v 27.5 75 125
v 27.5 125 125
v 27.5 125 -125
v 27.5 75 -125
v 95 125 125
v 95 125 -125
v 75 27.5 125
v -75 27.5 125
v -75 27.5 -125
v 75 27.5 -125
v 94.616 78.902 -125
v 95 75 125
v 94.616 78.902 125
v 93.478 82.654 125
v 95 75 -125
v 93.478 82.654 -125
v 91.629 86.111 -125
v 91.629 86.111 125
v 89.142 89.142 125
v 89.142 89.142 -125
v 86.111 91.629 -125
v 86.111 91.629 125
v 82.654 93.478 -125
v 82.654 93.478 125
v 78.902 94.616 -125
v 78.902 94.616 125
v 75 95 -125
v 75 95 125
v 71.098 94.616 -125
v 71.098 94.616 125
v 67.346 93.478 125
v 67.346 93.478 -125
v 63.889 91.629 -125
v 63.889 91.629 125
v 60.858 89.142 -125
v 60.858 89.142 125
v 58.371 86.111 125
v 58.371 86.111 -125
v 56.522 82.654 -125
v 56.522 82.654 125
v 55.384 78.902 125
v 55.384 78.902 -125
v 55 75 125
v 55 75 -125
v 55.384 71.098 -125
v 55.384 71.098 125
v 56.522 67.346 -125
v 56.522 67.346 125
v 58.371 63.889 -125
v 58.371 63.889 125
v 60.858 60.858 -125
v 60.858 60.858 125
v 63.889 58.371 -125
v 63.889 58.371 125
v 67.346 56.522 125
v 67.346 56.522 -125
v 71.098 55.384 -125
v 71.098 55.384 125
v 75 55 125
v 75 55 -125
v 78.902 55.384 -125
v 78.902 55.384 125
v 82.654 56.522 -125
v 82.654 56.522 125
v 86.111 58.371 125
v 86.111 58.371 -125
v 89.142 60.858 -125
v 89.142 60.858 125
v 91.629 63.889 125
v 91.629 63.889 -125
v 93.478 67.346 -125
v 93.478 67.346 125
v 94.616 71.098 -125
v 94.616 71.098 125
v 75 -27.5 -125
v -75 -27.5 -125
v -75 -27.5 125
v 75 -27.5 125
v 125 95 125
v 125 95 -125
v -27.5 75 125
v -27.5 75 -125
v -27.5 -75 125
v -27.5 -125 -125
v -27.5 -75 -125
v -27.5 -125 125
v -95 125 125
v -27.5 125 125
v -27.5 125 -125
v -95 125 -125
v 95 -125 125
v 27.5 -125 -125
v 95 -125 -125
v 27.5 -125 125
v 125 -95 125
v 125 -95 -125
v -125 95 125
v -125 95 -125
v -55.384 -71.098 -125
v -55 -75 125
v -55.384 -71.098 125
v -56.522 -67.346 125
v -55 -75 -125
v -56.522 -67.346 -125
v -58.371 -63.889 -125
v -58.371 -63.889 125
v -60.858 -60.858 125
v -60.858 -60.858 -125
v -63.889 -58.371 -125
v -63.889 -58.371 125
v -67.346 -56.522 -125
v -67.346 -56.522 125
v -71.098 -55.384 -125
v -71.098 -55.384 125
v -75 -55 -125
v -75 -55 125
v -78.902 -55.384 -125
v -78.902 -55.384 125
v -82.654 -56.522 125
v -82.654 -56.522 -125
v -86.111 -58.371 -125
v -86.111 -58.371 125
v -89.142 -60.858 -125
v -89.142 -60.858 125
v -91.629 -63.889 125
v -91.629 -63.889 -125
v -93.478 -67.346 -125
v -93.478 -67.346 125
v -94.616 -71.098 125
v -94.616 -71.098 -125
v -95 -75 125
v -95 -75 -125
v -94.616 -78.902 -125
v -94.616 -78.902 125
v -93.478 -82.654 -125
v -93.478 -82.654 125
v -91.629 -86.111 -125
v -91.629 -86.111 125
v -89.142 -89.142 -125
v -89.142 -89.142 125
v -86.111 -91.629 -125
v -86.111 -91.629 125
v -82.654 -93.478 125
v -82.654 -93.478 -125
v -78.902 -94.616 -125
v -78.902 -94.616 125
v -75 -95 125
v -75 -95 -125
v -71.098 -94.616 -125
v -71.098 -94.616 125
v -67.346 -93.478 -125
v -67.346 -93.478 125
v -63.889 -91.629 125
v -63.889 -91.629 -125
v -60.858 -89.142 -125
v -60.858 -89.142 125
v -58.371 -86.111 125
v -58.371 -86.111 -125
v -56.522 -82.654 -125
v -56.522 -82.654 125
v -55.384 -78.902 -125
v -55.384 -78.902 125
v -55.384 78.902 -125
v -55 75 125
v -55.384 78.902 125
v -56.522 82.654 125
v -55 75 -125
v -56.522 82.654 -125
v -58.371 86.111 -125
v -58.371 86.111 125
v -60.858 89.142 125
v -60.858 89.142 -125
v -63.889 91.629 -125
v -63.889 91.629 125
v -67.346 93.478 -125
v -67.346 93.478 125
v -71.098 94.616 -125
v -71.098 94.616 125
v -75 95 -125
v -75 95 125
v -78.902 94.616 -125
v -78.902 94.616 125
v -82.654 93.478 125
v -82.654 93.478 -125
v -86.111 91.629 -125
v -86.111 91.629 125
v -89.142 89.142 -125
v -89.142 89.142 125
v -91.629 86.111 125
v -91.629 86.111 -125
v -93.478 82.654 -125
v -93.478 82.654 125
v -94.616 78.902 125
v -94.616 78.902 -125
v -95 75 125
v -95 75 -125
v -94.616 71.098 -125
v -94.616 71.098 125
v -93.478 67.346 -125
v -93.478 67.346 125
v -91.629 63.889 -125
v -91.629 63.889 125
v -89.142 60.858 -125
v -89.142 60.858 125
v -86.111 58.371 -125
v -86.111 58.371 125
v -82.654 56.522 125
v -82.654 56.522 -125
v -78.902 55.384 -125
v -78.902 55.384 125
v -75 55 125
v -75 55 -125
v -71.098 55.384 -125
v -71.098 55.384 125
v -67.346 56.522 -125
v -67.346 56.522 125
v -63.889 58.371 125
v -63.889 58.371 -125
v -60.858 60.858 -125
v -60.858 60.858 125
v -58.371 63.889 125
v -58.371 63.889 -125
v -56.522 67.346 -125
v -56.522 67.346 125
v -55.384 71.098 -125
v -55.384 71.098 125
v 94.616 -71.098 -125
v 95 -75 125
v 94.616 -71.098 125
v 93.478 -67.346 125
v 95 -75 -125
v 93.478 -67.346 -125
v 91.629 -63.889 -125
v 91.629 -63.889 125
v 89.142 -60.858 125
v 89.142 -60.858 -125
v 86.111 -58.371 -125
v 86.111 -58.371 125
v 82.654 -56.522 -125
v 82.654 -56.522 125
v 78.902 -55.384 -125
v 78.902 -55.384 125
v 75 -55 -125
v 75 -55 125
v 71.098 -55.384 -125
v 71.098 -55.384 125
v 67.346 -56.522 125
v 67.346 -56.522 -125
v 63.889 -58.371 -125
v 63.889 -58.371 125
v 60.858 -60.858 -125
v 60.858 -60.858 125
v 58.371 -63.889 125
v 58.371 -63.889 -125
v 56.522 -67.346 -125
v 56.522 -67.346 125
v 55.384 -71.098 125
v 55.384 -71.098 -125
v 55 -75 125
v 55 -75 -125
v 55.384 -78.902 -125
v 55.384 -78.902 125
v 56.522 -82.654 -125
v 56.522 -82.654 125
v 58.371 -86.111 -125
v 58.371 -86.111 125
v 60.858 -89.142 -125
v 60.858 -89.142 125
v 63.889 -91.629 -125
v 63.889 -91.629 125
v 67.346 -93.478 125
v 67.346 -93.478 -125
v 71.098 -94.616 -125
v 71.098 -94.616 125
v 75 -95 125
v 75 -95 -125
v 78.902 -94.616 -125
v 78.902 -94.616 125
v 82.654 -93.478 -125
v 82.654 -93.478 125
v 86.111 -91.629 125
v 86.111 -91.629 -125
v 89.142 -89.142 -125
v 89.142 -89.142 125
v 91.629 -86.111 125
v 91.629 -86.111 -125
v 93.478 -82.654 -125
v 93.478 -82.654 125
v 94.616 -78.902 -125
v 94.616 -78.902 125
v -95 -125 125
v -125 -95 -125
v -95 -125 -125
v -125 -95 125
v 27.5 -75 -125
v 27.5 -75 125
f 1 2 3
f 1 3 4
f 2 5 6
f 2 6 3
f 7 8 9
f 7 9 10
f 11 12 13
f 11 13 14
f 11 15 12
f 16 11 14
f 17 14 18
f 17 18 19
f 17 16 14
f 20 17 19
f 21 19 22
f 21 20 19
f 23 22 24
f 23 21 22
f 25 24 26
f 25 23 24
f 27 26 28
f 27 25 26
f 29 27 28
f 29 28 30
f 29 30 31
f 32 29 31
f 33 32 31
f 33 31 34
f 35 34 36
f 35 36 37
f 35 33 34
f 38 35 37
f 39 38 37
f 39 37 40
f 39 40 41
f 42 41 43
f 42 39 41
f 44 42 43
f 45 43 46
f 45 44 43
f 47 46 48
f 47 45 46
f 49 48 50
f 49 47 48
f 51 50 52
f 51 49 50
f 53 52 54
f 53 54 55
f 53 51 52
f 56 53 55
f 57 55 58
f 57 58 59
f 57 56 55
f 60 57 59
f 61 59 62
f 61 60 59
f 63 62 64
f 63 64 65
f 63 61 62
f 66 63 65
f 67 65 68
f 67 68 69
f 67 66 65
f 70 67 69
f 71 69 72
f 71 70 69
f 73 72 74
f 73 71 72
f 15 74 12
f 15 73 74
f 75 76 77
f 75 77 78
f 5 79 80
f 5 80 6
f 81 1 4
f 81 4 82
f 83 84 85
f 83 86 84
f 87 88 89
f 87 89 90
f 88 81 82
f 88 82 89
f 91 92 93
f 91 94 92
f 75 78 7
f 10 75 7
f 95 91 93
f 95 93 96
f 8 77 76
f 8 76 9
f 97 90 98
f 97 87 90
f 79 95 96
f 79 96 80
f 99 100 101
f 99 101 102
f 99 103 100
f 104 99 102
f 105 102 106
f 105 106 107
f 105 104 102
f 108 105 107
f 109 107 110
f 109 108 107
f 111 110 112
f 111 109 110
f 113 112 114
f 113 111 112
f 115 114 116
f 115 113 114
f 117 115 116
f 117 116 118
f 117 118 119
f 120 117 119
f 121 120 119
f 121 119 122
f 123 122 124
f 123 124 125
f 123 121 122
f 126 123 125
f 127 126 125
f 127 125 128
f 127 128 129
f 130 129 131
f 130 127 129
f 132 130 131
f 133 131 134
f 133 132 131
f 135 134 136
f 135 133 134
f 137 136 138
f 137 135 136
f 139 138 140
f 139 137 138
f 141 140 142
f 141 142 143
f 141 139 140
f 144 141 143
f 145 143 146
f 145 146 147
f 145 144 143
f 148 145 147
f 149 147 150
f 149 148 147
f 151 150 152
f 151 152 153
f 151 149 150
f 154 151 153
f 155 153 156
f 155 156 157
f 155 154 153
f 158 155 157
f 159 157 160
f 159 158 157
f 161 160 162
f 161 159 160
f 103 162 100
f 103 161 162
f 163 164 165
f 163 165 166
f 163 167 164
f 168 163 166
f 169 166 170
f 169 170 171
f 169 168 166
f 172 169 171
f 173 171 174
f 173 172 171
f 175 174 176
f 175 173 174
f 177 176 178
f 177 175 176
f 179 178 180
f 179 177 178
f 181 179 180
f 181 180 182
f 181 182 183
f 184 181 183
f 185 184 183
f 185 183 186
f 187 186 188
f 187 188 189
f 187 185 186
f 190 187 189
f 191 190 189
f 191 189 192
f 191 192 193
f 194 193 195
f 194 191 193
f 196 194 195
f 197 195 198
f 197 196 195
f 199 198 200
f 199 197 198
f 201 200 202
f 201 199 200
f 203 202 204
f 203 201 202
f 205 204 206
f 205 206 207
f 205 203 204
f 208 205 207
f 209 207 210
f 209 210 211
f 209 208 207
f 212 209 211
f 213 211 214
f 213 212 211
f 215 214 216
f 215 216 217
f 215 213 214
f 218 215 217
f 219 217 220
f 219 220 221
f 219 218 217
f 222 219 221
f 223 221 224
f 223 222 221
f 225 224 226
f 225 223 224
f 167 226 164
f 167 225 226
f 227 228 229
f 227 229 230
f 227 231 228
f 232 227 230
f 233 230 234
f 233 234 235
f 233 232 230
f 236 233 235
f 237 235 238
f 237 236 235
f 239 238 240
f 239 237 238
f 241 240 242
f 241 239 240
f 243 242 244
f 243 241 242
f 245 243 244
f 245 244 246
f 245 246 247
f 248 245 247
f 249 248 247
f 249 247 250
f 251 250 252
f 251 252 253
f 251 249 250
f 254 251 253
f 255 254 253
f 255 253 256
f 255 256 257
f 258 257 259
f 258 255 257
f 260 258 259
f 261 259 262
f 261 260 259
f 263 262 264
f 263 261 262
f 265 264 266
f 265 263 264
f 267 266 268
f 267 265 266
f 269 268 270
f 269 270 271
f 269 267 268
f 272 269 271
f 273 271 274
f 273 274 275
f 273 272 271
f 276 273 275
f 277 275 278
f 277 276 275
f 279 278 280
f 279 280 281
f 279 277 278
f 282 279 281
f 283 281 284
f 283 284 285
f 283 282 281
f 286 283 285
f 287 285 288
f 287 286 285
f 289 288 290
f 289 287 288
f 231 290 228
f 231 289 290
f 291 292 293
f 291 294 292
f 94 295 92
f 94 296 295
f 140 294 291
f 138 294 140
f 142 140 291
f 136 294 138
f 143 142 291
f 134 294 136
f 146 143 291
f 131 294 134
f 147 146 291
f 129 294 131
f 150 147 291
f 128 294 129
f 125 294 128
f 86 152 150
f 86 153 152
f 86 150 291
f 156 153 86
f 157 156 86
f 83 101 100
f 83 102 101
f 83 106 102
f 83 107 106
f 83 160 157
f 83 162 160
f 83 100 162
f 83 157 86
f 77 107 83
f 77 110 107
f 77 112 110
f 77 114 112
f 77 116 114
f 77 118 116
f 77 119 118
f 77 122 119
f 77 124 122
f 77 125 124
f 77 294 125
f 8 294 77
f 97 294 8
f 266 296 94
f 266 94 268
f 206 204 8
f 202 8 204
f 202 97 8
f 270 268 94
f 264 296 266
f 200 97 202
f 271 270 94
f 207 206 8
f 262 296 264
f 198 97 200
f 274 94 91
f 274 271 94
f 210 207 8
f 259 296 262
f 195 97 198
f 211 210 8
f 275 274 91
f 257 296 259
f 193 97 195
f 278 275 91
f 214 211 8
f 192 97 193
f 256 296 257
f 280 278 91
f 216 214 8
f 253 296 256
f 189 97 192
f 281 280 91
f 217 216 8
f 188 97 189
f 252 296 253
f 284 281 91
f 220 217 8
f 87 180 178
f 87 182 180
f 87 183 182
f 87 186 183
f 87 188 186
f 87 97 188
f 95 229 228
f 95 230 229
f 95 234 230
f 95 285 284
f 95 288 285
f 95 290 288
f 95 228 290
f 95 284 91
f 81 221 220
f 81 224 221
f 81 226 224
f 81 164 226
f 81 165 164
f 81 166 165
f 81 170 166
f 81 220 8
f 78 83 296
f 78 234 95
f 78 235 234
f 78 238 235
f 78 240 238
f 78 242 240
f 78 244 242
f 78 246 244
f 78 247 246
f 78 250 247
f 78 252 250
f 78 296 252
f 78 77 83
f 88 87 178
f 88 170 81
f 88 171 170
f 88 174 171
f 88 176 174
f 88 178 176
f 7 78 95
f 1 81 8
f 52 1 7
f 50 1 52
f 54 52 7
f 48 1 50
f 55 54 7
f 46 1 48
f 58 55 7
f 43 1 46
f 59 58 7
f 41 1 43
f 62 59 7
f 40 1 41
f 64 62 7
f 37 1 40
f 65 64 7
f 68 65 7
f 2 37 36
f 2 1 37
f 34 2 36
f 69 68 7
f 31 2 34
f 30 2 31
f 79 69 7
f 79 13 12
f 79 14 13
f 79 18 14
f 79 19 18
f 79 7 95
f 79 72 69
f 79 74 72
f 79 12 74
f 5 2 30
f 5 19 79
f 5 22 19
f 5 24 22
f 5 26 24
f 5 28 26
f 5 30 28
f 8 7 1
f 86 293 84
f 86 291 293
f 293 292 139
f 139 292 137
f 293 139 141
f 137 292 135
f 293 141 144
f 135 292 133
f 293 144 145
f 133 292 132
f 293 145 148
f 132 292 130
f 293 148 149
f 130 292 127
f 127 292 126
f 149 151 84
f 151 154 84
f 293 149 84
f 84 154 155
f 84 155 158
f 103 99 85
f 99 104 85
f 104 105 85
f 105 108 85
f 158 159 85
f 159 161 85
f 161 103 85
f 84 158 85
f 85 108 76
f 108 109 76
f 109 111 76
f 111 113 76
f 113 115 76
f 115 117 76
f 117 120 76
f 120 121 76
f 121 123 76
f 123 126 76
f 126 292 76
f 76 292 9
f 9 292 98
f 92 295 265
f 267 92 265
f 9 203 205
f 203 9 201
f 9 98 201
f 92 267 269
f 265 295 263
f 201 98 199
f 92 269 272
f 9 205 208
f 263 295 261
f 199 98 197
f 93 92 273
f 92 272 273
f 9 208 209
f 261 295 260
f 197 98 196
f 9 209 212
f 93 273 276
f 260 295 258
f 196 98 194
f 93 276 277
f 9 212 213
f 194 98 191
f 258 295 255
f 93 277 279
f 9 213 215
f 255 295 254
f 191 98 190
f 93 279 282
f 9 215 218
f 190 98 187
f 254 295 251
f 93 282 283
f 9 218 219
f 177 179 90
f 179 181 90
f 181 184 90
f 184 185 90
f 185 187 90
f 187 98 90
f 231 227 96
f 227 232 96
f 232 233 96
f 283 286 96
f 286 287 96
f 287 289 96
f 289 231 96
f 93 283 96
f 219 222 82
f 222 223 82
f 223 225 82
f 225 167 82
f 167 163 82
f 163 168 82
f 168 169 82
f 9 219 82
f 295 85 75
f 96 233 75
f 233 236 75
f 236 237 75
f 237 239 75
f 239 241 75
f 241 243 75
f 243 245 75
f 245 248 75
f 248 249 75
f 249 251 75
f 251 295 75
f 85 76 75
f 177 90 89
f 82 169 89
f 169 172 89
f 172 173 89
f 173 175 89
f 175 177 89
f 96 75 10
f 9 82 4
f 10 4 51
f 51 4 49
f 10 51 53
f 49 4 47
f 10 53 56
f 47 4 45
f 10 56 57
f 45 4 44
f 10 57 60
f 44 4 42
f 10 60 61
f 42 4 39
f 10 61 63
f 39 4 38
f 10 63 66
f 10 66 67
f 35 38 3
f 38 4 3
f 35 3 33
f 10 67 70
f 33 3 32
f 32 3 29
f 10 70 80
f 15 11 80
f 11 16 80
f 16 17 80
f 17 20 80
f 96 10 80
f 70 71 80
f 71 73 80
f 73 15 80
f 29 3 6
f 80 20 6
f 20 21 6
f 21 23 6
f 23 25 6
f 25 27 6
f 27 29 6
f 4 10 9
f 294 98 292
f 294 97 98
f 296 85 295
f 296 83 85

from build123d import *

# Parameters (mm, degrees)
F0_R     = 20
F0_W     = 150
F0_H     = 55
F1_DEPTH = 125


with BuildPart() as f1:
    # F0 (on Top) → F1 (new body, symmetric)
    with BuildSketch(Plane.XY):
        Polygon((27.5, -125), (95, -125), (125, -95), (125, 95), (95, 125), (27.5, 125), (27.5, 75), (-27.5, 75), (-27.5, 125), (-95, 125), (-125, 95), (-125, -95), (-95, -125), (-27.5, -125), (-27.5, -75), (27.5, -75), align=None)
        with Locations((-75, -75)):
            Circle(F0_R, mode=Mode.SUBTRACT)
        with Locations((75, -75)):
            Circle(F0_R, mode=Mode.SUBTRACT)
        with Locations((-75, 75)):
            Circle(F0_R, mode=Mode.SUBTRACT)
        Rectangle(F0_W, F0_H, mode=Mode.SUBTRACT)
        with Locations((75, 75)):
            Circle(F0_R, mode=Mode.SUBTRACT)
    extrude(amount=F1_DEPTH, both=True)


solid = f1.part
